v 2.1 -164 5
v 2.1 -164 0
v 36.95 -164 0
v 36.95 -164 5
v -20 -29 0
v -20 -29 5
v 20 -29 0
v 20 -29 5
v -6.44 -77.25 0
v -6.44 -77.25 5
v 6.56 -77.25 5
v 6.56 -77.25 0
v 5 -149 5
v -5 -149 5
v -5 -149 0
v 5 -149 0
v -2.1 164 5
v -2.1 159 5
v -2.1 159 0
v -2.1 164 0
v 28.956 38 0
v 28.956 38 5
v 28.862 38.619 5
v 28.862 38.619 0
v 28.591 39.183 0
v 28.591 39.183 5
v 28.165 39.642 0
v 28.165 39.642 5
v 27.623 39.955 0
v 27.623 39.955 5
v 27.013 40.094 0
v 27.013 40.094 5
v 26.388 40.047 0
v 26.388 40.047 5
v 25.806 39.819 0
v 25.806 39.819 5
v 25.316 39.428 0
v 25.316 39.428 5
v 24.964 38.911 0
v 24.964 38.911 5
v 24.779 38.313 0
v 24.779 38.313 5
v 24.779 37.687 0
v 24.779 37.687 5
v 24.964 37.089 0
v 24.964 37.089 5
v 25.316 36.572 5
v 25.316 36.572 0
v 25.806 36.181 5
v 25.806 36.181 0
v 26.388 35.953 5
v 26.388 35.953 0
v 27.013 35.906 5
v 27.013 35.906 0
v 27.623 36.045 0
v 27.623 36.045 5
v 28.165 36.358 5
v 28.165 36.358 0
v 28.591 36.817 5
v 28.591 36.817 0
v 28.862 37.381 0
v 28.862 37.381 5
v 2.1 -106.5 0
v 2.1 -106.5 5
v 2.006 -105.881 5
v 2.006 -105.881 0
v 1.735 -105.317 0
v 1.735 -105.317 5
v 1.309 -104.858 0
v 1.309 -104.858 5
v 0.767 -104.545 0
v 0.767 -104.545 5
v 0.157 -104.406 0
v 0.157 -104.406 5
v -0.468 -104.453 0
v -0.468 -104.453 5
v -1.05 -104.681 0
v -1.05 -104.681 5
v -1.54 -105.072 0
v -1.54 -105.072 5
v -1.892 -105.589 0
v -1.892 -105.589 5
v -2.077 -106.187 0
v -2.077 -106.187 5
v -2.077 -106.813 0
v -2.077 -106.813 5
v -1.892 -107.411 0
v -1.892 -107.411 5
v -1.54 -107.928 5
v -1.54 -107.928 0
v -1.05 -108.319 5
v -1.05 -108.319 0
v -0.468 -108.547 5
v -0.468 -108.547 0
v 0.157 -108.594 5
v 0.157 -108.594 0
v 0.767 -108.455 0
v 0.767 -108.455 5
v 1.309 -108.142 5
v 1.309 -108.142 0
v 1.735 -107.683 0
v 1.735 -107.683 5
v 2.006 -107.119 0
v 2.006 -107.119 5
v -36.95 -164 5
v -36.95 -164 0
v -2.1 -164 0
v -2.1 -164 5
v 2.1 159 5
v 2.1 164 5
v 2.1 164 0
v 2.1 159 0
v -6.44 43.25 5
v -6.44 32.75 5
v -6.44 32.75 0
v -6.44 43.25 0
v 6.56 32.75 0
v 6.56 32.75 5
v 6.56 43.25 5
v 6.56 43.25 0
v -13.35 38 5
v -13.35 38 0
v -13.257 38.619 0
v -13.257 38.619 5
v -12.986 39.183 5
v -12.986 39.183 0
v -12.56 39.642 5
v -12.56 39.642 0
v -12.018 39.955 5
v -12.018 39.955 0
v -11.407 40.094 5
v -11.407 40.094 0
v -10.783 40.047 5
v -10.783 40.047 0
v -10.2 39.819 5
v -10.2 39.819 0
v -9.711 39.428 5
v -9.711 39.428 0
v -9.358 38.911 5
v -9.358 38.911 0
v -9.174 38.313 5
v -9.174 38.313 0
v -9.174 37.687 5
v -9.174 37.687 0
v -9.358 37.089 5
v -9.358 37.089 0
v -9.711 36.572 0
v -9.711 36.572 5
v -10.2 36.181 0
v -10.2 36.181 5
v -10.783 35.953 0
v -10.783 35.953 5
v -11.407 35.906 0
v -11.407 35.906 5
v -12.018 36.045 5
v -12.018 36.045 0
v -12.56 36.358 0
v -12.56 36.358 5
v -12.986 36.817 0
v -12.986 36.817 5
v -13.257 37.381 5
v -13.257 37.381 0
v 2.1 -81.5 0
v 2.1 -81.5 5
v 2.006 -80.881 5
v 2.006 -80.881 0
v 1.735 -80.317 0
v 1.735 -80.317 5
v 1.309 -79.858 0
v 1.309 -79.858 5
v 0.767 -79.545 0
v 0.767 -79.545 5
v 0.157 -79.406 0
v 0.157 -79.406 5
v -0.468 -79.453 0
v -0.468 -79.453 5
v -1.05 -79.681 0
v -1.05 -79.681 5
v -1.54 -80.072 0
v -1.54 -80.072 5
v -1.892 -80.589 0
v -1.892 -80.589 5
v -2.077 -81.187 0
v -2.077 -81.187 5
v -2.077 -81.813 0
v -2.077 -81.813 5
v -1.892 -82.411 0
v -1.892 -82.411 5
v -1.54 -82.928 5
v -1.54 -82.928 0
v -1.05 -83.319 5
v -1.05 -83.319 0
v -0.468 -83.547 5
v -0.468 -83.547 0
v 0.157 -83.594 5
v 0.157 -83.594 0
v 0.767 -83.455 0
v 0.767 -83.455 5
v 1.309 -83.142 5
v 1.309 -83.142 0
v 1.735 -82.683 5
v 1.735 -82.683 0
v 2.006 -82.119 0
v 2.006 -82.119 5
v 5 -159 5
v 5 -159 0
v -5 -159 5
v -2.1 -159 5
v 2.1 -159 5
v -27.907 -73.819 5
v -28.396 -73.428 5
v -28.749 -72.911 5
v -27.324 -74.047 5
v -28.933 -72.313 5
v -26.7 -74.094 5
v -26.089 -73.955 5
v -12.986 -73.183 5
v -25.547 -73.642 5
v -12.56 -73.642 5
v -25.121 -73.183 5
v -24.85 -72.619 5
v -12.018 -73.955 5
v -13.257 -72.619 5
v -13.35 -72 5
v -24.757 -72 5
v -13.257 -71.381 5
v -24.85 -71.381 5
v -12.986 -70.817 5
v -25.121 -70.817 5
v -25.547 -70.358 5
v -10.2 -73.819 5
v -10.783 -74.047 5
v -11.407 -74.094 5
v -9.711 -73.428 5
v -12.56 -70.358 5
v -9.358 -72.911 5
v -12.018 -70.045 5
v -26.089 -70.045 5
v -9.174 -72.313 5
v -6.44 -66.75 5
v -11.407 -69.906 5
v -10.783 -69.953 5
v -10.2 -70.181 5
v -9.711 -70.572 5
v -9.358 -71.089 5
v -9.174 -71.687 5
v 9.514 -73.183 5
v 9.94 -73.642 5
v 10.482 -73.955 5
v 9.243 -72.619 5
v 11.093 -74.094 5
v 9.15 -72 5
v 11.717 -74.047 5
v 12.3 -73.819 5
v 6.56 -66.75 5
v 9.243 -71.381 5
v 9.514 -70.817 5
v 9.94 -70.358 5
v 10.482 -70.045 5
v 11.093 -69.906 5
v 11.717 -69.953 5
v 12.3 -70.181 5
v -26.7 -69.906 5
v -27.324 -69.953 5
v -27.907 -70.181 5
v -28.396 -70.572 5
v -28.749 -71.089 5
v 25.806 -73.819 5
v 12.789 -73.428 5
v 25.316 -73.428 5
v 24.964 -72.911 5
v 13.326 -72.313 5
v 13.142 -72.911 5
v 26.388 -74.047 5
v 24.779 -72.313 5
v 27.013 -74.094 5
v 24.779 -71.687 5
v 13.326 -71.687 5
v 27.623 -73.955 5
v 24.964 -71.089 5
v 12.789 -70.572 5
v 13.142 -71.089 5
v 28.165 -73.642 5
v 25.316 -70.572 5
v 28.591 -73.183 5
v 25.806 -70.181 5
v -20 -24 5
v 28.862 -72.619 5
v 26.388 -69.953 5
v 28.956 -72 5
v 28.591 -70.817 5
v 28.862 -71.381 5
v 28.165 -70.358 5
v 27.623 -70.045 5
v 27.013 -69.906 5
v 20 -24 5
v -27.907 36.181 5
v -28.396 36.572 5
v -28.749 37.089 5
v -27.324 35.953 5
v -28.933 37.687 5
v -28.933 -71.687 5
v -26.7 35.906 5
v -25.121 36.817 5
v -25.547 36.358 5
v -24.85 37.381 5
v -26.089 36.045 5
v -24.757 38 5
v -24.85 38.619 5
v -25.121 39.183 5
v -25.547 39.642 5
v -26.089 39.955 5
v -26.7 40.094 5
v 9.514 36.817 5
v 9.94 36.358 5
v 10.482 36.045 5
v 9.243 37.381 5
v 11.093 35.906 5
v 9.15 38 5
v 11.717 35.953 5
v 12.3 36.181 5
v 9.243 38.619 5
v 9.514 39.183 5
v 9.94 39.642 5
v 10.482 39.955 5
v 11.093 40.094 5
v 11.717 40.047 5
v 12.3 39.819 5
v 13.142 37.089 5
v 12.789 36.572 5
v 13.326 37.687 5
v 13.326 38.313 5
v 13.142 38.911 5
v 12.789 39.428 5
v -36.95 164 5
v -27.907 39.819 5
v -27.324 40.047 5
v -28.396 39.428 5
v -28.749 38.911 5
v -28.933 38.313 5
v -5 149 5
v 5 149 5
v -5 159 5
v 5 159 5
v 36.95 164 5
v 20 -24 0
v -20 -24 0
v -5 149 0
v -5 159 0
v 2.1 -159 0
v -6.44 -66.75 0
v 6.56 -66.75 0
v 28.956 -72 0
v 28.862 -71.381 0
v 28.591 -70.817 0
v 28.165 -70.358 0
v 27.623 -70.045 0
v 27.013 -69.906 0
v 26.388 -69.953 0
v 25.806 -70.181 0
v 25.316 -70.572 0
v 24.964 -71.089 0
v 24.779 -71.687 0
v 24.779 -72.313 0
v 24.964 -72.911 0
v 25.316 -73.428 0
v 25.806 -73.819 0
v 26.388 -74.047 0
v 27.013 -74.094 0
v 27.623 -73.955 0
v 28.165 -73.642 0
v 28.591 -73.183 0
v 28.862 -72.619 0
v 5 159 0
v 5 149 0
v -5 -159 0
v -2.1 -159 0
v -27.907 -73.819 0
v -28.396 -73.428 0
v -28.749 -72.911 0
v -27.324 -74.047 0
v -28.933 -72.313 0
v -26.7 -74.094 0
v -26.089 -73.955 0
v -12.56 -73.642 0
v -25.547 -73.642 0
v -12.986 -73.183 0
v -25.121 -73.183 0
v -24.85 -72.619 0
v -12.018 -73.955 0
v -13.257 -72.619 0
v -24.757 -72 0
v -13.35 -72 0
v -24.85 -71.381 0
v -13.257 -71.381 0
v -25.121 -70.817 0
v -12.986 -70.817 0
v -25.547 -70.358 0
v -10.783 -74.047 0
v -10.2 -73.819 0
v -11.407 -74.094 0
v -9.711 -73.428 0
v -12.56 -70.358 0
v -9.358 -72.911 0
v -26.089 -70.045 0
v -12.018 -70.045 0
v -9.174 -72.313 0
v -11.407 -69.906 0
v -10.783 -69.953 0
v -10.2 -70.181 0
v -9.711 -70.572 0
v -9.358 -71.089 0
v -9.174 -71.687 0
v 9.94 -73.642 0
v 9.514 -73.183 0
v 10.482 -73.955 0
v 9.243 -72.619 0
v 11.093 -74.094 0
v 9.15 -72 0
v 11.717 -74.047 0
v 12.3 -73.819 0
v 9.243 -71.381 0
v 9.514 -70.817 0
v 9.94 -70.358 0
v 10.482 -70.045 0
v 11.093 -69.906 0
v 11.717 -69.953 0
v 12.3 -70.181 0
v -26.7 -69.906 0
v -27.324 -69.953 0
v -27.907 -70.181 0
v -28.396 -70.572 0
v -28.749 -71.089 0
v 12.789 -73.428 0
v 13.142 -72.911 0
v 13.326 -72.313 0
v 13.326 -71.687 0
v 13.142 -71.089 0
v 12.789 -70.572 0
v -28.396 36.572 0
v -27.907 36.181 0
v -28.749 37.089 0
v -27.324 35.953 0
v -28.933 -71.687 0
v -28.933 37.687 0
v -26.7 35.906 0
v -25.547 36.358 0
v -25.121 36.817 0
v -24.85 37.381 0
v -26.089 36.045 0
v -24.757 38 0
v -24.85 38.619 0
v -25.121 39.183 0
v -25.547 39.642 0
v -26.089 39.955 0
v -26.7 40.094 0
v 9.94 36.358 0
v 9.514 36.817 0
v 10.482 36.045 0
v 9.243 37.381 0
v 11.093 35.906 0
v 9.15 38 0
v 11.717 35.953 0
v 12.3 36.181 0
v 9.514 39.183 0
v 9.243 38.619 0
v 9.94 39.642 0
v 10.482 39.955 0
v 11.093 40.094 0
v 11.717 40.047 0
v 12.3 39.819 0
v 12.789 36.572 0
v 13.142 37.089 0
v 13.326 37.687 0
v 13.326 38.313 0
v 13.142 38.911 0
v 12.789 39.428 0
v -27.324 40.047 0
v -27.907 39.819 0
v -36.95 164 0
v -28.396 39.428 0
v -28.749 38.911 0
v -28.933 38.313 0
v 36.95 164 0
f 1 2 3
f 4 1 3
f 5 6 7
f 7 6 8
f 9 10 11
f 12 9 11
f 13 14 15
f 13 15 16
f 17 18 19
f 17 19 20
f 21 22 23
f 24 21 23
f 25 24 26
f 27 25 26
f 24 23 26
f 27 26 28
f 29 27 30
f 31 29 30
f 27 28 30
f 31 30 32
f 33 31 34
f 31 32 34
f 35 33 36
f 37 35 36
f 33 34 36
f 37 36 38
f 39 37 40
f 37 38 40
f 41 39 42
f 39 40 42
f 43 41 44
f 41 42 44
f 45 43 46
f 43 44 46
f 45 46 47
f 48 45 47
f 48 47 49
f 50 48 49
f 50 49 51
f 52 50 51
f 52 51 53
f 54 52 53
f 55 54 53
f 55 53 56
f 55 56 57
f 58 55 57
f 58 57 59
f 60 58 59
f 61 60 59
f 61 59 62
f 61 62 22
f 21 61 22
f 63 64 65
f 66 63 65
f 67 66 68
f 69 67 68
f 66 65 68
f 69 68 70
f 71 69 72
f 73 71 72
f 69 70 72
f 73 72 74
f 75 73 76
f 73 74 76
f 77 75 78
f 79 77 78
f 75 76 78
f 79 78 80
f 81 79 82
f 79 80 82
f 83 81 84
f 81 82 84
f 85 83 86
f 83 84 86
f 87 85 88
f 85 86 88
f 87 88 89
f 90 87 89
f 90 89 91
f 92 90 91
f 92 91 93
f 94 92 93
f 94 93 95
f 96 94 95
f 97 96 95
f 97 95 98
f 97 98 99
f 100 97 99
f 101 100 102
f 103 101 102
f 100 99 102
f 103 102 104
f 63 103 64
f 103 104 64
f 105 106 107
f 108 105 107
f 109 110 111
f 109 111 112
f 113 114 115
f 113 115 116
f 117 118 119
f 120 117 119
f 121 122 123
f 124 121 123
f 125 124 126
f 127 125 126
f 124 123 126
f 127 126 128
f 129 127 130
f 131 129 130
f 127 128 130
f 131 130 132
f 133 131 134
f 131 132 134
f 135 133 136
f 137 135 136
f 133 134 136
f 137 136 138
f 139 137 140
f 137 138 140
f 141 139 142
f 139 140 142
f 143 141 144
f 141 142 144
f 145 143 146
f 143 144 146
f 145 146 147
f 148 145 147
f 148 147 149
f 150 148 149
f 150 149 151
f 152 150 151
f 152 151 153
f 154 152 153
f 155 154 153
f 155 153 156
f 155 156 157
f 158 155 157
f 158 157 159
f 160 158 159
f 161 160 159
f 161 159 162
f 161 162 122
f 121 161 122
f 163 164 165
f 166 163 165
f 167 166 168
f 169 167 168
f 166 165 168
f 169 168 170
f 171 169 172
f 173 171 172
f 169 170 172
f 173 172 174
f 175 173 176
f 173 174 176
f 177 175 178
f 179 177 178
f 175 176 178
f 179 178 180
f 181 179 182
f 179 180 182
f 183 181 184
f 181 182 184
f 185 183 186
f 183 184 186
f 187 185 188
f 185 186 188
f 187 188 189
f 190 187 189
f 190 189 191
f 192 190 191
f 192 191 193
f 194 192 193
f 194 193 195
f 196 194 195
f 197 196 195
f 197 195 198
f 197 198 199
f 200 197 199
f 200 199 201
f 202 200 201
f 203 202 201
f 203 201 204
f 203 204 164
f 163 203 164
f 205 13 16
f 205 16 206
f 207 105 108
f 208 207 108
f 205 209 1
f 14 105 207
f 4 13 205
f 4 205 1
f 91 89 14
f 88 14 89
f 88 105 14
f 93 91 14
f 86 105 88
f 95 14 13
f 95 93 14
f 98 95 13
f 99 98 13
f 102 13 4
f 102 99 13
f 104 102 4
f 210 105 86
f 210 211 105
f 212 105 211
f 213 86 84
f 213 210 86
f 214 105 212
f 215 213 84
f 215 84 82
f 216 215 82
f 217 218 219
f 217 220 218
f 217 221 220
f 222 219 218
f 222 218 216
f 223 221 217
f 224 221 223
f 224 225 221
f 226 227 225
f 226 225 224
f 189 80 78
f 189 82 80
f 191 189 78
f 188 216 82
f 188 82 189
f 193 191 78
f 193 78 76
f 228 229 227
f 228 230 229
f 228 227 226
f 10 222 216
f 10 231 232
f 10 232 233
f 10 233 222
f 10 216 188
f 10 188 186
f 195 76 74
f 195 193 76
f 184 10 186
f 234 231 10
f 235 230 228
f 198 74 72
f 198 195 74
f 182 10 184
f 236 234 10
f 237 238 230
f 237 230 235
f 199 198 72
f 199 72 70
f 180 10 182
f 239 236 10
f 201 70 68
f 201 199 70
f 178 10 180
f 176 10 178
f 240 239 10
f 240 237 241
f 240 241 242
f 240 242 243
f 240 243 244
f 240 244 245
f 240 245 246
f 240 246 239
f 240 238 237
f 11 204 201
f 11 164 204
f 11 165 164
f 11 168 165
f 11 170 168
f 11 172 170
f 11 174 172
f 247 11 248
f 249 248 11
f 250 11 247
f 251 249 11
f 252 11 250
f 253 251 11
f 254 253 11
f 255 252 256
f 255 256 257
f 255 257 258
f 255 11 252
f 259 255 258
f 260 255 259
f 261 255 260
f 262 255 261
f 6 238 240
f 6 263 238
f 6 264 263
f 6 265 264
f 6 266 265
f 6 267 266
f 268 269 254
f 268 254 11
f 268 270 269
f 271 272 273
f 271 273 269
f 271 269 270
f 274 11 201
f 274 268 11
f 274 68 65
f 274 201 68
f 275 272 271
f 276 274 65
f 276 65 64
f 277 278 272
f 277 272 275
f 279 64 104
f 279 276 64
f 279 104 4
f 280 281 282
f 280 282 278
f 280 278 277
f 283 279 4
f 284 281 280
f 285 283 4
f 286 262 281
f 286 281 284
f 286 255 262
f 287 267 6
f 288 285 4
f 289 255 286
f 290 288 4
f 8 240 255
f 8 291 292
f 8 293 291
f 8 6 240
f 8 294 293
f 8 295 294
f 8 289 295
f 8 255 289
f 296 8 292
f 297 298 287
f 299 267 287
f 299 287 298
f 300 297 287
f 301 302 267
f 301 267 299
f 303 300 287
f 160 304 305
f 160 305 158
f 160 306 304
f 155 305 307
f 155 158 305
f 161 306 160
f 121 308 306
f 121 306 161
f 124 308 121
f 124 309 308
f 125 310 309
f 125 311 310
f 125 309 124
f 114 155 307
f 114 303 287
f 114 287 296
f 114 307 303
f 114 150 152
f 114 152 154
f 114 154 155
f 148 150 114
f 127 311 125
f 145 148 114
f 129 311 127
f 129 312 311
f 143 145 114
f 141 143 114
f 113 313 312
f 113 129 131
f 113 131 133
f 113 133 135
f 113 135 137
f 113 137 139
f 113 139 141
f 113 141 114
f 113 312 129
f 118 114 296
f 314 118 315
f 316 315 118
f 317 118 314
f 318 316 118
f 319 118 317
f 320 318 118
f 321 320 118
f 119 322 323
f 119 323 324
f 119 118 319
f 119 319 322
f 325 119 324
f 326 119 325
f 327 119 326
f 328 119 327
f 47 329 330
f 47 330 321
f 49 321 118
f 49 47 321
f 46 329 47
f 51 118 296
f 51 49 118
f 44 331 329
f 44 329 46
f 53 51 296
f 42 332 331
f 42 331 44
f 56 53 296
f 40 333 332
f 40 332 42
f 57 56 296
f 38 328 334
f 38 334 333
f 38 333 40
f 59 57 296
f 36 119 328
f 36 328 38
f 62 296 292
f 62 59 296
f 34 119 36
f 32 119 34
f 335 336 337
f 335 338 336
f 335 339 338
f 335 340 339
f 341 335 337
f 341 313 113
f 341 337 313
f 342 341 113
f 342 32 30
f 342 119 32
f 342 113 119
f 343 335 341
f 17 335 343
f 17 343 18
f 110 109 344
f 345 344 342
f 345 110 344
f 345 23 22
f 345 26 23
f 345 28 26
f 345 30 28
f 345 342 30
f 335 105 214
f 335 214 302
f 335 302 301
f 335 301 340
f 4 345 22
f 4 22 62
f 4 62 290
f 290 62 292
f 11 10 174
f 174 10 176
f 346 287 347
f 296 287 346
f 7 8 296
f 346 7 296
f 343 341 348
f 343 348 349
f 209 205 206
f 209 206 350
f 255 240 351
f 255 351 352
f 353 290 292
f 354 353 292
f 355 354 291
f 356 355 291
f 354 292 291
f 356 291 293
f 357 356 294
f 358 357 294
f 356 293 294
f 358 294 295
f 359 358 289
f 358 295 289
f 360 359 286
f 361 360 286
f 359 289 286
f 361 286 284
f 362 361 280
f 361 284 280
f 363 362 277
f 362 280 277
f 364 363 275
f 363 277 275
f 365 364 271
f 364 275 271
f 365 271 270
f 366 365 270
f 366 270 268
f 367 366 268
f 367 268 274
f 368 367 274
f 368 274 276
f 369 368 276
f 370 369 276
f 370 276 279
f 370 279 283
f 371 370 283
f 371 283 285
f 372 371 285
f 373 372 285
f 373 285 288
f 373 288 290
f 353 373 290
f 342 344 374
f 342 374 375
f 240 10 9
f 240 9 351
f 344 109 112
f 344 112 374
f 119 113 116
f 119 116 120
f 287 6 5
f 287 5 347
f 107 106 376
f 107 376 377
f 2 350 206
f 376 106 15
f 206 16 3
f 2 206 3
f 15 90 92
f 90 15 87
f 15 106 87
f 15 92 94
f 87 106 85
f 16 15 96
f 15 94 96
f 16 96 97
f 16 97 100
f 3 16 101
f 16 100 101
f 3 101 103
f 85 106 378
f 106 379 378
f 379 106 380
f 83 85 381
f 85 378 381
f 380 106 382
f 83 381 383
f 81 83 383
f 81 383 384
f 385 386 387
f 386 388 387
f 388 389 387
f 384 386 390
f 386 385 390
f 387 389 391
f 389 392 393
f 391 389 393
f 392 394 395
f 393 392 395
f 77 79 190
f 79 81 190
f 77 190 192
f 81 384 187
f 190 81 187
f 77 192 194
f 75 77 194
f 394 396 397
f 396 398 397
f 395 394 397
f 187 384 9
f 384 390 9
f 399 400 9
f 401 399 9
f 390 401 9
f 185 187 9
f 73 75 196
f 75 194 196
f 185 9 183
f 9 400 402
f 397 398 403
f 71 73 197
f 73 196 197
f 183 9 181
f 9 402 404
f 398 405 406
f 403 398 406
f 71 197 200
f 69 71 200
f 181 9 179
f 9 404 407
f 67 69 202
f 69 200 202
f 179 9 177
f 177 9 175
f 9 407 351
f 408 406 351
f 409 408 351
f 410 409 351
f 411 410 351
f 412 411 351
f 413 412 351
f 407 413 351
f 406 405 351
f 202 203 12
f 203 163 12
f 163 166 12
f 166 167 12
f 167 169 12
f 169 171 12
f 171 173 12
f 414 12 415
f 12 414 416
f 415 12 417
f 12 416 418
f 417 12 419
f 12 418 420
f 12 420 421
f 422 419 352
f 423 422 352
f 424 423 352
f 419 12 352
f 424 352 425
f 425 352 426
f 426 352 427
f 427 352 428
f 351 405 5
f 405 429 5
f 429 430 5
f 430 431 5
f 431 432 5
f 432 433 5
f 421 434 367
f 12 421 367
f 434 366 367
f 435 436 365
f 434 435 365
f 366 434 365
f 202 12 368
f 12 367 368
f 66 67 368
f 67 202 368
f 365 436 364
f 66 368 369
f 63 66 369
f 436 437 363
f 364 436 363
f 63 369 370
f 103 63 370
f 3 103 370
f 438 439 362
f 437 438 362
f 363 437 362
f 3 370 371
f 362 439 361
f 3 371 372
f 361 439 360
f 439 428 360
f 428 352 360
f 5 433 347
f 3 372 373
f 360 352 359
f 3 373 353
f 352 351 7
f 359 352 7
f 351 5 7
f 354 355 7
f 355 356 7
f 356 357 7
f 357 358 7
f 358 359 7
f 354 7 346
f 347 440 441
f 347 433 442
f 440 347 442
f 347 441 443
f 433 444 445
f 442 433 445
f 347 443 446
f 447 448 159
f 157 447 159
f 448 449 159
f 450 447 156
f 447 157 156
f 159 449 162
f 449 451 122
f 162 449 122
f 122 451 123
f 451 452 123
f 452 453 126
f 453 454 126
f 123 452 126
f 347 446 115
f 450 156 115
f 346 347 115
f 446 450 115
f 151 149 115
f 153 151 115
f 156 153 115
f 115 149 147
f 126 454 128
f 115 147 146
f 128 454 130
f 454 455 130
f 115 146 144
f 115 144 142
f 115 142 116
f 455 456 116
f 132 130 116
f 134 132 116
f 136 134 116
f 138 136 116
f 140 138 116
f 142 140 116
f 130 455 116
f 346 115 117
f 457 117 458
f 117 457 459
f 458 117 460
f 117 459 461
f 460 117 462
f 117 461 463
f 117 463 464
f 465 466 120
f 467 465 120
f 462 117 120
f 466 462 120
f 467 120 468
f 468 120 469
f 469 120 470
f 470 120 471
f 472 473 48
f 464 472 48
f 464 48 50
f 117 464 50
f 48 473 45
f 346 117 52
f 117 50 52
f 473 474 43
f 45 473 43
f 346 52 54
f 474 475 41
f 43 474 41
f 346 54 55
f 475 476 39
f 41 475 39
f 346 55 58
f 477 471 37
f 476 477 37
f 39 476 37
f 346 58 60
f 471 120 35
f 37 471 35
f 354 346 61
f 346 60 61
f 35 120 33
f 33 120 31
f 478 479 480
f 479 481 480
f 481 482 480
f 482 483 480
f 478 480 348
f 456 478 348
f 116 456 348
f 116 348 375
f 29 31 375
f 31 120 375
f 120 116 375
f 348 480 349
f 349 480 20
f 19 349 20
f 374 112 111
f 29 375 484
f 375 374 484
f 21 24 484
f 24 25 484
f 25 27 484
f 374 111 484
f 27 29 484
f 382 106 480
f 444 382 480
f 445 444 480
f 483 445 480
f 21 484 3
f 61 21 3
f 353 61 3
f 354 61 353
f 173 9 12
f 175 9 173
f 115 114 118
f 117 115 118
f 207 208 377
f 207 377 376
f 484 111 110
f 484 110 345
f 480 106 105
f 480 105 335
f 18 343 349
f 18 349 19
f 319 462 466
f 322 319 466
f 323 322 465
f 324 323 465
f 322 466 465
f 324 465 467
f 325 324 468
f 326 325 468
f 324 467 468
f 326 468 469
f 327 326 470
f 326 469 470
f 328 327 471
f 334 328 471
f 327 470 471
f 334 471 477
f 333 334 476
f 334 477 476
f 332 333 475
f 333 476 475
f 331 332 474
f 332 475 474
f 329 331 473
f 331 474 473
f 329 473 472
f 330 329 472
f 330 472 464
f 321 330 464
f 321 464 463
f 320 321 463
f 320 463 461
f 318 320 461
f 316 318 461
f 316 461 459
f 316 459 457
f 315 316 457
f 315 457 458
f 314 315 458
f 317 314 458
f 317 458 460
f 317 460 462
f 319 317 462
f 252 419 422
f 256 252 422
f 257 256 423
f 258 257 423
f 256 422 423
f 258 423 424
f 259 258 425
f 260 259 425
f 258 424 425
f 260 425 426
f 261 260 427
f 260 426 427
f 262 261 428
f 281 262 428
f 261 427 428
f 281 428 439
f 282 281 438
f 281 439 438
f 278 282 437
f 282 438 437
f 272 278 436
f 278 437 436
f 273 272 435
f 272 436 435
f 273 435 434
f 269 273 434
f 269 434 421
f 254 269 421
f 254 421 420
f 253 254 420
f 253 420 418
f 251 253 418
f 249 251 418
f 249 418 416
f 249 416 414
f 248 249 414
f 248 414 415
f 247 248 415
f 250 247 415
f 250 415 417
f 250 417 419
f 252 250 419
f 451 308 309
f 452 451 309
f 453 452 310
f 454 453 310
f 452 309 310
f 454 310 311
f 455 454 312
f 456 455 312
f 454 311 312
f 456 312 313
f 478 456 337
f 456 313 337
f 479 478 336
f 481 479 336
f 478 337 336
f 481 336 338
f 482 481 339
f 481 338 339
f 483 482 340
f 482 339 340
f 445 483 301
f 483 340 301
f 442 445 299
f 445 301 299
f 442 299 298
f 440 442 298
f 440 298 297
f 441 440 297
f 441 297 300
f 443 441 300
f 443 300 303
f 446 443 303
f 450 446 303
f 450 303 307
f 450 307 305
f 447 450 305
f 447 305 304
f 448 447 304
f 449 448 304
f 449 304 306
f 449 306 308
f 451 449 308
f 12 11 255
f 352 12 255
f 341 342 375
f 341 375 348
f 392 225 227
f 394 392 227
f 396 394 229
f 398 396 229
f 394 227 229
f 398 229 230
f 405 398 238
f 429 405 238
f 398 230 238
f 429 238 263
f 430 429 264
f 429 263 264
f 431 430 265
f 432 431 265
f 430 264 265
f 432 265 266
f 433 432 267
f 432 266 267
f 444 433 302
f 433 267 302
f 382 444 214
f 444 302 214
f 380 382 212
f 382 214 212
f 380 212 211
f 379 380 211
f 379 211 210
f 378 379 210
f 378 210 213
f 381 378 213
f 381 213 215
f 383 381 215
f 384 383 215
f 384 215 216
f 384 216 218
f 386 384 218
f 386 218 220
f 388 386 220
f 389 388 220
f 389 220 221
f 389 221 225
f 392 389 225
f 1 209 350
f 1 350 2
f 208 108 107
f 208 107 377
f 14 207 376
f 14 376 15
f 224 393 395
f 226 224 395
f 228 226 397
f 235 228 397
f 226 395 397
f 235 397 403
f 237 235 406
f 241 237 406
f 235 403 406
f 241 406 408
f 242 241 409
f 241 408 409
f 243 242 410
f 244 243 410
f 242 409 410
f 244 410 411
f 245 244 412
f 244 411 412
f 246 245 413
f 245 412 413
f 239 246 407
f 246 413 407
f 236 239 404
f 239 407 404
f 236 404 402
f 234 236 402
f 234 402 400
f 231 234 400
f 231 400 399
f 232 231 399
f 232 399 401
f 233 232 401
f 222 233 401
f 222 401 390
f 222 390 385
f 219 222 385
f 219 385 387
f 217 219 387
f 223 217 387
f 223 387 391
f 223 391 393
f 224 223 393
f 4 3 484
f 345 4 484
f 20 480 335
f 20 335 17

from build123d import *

# Parameters (mm, degrees)
SKETCH1_W           = 73.9
SKETCH1_H           = 328
BOSS_EXTRUDE1_DEPTH = 5
SKETCH2_R           = 2.1
CUT_EXTRUDE1_DEPTH  = 10
CUT_EXTRUDE2_DEPTH  = 10
SKETCH5_R           = 2.1
CUT_EXTRUDE3_DEPTH  = 5
SKETCH6_R           = 2.1
SKETCH6_W           = 13
SKETCH6_H           = 10.5
CUT_EXTRUDE4_DEPTH  = 180
SKETCH7_R           = 2.1
CUT_EXTRUDE5_DEPTH  = 180
SKETCH8_W           = 40
SKETCH8_H           = 5
CUT_EXTRUDE6_DEPTH  = 5


with BuildPart() as part:
    # Sketch1 → Boss-Extrude1 (new body)
    with BuildSketch(Plane.XY):
        Rectangle(SKETCH1_W, SKETCH1_H)
    extrude(amount=BOSS_EXTRUDE1_DEPTH)

    # Sketch2 → Cut-Extrude1 (cut)
    with BuildSketch(Plane.XY.offset(5)):
        with Locations((-0.000417228, -81.5)):
            Circle(SKETCH2_R)
    extrude(amount=-CUT_EXTRUDE1_DEPTH, mode=Mode.SUBTRACT)

    # Sketch3 → Cut-Extrude2 (cut)
    with BuildSketch(Plane.XY.offset(5)):
        Polygon((-2.1, -164), (-2.1, -159), (-5, -159), (-5, -149), (5, -149), (5, -159), (2.1, -159), (2.1, -164), align=None)
        Polygon((2.1, 164), (2.1, 159), (5, 159), (5, 149), (-5, 149), (-5, 159), (-2.1, 159), (-2.1, 164), align=None)
    extrude(amount=-CUT_EXTRUDE2_DEPTH, mode=Mode.SUBTRACT)

    # Sketch5 → Cut-Extrude3 (cut)
    with BuildSketch(Plane.XY.offset(5)):
        with Locations((-0.000417228, -106.5)):
            Circle(SKETCH5_R)
    extrude(amount=-CUT_EXTRUDE3_DEPTH, mode=Mode.SUBTRACT)

    # Sketch6 → Cut-Extrude4 (cut)
    with BuildSketch(Plane.XY.offset(5)):
        with Locations((-26.856574817, 38)):
            Circle(SKETCH6_R)
        with Locations((26.85574036, 38)):
            Circle(SKETCH6_R)
        with Locations((26.85574036, -72)):
            Circle(SKETCH6_R)
        with Locations((-26.856574817, -72)):
            Circle(SKETCH6_R)
        with Locations((0.059582772, 38)):
            Rectangle(SKETCH6_W, SKETCH6_H)
        with Locations((0.059582772, -72)):
            Rectangle(SKETCH6_W, SKETCH6_H)
    extrude(amount=-CUT_EXTRUDE4_DEPTH, mode=Mode.SUBTRACT)

    # Sketch7 → Cut-Extrude5 (cut)
    with BuildSketch(Plane(origin=(0, 0, 0), x_dir=(-1, 0, 0), z_dir=(0, 0, -1))):
        with Locations((11.250417228, 38)):
            Circle(SKETCH7_R)
        with Locations((-11.249582772, 38)):
            Circle(SKETCH7_R)
        with Locations((-11.249582772, -72)):
            Circle(SKETCH7_R)
        with Locations((11.250417228, -72)):
            Circle(SKETCH7_R)
    extrude(amount=-CUT_EXTRUDE5_DEPTH, mode=Mode.SUBTRACT)

    # Sketch8 → Cut-Extrude6 (cut)
    with BuildSketch(Plane.XY.offset(5)):
        with Locations((-0.000417229, -26.5)):
            Rectangle(SKETCH8_W, SKETCH8_H)
    extrude(amount=-CUT_EXTRUDE6_DEPTH, mode=Mode.SUBTRACT)


solid = part.part
